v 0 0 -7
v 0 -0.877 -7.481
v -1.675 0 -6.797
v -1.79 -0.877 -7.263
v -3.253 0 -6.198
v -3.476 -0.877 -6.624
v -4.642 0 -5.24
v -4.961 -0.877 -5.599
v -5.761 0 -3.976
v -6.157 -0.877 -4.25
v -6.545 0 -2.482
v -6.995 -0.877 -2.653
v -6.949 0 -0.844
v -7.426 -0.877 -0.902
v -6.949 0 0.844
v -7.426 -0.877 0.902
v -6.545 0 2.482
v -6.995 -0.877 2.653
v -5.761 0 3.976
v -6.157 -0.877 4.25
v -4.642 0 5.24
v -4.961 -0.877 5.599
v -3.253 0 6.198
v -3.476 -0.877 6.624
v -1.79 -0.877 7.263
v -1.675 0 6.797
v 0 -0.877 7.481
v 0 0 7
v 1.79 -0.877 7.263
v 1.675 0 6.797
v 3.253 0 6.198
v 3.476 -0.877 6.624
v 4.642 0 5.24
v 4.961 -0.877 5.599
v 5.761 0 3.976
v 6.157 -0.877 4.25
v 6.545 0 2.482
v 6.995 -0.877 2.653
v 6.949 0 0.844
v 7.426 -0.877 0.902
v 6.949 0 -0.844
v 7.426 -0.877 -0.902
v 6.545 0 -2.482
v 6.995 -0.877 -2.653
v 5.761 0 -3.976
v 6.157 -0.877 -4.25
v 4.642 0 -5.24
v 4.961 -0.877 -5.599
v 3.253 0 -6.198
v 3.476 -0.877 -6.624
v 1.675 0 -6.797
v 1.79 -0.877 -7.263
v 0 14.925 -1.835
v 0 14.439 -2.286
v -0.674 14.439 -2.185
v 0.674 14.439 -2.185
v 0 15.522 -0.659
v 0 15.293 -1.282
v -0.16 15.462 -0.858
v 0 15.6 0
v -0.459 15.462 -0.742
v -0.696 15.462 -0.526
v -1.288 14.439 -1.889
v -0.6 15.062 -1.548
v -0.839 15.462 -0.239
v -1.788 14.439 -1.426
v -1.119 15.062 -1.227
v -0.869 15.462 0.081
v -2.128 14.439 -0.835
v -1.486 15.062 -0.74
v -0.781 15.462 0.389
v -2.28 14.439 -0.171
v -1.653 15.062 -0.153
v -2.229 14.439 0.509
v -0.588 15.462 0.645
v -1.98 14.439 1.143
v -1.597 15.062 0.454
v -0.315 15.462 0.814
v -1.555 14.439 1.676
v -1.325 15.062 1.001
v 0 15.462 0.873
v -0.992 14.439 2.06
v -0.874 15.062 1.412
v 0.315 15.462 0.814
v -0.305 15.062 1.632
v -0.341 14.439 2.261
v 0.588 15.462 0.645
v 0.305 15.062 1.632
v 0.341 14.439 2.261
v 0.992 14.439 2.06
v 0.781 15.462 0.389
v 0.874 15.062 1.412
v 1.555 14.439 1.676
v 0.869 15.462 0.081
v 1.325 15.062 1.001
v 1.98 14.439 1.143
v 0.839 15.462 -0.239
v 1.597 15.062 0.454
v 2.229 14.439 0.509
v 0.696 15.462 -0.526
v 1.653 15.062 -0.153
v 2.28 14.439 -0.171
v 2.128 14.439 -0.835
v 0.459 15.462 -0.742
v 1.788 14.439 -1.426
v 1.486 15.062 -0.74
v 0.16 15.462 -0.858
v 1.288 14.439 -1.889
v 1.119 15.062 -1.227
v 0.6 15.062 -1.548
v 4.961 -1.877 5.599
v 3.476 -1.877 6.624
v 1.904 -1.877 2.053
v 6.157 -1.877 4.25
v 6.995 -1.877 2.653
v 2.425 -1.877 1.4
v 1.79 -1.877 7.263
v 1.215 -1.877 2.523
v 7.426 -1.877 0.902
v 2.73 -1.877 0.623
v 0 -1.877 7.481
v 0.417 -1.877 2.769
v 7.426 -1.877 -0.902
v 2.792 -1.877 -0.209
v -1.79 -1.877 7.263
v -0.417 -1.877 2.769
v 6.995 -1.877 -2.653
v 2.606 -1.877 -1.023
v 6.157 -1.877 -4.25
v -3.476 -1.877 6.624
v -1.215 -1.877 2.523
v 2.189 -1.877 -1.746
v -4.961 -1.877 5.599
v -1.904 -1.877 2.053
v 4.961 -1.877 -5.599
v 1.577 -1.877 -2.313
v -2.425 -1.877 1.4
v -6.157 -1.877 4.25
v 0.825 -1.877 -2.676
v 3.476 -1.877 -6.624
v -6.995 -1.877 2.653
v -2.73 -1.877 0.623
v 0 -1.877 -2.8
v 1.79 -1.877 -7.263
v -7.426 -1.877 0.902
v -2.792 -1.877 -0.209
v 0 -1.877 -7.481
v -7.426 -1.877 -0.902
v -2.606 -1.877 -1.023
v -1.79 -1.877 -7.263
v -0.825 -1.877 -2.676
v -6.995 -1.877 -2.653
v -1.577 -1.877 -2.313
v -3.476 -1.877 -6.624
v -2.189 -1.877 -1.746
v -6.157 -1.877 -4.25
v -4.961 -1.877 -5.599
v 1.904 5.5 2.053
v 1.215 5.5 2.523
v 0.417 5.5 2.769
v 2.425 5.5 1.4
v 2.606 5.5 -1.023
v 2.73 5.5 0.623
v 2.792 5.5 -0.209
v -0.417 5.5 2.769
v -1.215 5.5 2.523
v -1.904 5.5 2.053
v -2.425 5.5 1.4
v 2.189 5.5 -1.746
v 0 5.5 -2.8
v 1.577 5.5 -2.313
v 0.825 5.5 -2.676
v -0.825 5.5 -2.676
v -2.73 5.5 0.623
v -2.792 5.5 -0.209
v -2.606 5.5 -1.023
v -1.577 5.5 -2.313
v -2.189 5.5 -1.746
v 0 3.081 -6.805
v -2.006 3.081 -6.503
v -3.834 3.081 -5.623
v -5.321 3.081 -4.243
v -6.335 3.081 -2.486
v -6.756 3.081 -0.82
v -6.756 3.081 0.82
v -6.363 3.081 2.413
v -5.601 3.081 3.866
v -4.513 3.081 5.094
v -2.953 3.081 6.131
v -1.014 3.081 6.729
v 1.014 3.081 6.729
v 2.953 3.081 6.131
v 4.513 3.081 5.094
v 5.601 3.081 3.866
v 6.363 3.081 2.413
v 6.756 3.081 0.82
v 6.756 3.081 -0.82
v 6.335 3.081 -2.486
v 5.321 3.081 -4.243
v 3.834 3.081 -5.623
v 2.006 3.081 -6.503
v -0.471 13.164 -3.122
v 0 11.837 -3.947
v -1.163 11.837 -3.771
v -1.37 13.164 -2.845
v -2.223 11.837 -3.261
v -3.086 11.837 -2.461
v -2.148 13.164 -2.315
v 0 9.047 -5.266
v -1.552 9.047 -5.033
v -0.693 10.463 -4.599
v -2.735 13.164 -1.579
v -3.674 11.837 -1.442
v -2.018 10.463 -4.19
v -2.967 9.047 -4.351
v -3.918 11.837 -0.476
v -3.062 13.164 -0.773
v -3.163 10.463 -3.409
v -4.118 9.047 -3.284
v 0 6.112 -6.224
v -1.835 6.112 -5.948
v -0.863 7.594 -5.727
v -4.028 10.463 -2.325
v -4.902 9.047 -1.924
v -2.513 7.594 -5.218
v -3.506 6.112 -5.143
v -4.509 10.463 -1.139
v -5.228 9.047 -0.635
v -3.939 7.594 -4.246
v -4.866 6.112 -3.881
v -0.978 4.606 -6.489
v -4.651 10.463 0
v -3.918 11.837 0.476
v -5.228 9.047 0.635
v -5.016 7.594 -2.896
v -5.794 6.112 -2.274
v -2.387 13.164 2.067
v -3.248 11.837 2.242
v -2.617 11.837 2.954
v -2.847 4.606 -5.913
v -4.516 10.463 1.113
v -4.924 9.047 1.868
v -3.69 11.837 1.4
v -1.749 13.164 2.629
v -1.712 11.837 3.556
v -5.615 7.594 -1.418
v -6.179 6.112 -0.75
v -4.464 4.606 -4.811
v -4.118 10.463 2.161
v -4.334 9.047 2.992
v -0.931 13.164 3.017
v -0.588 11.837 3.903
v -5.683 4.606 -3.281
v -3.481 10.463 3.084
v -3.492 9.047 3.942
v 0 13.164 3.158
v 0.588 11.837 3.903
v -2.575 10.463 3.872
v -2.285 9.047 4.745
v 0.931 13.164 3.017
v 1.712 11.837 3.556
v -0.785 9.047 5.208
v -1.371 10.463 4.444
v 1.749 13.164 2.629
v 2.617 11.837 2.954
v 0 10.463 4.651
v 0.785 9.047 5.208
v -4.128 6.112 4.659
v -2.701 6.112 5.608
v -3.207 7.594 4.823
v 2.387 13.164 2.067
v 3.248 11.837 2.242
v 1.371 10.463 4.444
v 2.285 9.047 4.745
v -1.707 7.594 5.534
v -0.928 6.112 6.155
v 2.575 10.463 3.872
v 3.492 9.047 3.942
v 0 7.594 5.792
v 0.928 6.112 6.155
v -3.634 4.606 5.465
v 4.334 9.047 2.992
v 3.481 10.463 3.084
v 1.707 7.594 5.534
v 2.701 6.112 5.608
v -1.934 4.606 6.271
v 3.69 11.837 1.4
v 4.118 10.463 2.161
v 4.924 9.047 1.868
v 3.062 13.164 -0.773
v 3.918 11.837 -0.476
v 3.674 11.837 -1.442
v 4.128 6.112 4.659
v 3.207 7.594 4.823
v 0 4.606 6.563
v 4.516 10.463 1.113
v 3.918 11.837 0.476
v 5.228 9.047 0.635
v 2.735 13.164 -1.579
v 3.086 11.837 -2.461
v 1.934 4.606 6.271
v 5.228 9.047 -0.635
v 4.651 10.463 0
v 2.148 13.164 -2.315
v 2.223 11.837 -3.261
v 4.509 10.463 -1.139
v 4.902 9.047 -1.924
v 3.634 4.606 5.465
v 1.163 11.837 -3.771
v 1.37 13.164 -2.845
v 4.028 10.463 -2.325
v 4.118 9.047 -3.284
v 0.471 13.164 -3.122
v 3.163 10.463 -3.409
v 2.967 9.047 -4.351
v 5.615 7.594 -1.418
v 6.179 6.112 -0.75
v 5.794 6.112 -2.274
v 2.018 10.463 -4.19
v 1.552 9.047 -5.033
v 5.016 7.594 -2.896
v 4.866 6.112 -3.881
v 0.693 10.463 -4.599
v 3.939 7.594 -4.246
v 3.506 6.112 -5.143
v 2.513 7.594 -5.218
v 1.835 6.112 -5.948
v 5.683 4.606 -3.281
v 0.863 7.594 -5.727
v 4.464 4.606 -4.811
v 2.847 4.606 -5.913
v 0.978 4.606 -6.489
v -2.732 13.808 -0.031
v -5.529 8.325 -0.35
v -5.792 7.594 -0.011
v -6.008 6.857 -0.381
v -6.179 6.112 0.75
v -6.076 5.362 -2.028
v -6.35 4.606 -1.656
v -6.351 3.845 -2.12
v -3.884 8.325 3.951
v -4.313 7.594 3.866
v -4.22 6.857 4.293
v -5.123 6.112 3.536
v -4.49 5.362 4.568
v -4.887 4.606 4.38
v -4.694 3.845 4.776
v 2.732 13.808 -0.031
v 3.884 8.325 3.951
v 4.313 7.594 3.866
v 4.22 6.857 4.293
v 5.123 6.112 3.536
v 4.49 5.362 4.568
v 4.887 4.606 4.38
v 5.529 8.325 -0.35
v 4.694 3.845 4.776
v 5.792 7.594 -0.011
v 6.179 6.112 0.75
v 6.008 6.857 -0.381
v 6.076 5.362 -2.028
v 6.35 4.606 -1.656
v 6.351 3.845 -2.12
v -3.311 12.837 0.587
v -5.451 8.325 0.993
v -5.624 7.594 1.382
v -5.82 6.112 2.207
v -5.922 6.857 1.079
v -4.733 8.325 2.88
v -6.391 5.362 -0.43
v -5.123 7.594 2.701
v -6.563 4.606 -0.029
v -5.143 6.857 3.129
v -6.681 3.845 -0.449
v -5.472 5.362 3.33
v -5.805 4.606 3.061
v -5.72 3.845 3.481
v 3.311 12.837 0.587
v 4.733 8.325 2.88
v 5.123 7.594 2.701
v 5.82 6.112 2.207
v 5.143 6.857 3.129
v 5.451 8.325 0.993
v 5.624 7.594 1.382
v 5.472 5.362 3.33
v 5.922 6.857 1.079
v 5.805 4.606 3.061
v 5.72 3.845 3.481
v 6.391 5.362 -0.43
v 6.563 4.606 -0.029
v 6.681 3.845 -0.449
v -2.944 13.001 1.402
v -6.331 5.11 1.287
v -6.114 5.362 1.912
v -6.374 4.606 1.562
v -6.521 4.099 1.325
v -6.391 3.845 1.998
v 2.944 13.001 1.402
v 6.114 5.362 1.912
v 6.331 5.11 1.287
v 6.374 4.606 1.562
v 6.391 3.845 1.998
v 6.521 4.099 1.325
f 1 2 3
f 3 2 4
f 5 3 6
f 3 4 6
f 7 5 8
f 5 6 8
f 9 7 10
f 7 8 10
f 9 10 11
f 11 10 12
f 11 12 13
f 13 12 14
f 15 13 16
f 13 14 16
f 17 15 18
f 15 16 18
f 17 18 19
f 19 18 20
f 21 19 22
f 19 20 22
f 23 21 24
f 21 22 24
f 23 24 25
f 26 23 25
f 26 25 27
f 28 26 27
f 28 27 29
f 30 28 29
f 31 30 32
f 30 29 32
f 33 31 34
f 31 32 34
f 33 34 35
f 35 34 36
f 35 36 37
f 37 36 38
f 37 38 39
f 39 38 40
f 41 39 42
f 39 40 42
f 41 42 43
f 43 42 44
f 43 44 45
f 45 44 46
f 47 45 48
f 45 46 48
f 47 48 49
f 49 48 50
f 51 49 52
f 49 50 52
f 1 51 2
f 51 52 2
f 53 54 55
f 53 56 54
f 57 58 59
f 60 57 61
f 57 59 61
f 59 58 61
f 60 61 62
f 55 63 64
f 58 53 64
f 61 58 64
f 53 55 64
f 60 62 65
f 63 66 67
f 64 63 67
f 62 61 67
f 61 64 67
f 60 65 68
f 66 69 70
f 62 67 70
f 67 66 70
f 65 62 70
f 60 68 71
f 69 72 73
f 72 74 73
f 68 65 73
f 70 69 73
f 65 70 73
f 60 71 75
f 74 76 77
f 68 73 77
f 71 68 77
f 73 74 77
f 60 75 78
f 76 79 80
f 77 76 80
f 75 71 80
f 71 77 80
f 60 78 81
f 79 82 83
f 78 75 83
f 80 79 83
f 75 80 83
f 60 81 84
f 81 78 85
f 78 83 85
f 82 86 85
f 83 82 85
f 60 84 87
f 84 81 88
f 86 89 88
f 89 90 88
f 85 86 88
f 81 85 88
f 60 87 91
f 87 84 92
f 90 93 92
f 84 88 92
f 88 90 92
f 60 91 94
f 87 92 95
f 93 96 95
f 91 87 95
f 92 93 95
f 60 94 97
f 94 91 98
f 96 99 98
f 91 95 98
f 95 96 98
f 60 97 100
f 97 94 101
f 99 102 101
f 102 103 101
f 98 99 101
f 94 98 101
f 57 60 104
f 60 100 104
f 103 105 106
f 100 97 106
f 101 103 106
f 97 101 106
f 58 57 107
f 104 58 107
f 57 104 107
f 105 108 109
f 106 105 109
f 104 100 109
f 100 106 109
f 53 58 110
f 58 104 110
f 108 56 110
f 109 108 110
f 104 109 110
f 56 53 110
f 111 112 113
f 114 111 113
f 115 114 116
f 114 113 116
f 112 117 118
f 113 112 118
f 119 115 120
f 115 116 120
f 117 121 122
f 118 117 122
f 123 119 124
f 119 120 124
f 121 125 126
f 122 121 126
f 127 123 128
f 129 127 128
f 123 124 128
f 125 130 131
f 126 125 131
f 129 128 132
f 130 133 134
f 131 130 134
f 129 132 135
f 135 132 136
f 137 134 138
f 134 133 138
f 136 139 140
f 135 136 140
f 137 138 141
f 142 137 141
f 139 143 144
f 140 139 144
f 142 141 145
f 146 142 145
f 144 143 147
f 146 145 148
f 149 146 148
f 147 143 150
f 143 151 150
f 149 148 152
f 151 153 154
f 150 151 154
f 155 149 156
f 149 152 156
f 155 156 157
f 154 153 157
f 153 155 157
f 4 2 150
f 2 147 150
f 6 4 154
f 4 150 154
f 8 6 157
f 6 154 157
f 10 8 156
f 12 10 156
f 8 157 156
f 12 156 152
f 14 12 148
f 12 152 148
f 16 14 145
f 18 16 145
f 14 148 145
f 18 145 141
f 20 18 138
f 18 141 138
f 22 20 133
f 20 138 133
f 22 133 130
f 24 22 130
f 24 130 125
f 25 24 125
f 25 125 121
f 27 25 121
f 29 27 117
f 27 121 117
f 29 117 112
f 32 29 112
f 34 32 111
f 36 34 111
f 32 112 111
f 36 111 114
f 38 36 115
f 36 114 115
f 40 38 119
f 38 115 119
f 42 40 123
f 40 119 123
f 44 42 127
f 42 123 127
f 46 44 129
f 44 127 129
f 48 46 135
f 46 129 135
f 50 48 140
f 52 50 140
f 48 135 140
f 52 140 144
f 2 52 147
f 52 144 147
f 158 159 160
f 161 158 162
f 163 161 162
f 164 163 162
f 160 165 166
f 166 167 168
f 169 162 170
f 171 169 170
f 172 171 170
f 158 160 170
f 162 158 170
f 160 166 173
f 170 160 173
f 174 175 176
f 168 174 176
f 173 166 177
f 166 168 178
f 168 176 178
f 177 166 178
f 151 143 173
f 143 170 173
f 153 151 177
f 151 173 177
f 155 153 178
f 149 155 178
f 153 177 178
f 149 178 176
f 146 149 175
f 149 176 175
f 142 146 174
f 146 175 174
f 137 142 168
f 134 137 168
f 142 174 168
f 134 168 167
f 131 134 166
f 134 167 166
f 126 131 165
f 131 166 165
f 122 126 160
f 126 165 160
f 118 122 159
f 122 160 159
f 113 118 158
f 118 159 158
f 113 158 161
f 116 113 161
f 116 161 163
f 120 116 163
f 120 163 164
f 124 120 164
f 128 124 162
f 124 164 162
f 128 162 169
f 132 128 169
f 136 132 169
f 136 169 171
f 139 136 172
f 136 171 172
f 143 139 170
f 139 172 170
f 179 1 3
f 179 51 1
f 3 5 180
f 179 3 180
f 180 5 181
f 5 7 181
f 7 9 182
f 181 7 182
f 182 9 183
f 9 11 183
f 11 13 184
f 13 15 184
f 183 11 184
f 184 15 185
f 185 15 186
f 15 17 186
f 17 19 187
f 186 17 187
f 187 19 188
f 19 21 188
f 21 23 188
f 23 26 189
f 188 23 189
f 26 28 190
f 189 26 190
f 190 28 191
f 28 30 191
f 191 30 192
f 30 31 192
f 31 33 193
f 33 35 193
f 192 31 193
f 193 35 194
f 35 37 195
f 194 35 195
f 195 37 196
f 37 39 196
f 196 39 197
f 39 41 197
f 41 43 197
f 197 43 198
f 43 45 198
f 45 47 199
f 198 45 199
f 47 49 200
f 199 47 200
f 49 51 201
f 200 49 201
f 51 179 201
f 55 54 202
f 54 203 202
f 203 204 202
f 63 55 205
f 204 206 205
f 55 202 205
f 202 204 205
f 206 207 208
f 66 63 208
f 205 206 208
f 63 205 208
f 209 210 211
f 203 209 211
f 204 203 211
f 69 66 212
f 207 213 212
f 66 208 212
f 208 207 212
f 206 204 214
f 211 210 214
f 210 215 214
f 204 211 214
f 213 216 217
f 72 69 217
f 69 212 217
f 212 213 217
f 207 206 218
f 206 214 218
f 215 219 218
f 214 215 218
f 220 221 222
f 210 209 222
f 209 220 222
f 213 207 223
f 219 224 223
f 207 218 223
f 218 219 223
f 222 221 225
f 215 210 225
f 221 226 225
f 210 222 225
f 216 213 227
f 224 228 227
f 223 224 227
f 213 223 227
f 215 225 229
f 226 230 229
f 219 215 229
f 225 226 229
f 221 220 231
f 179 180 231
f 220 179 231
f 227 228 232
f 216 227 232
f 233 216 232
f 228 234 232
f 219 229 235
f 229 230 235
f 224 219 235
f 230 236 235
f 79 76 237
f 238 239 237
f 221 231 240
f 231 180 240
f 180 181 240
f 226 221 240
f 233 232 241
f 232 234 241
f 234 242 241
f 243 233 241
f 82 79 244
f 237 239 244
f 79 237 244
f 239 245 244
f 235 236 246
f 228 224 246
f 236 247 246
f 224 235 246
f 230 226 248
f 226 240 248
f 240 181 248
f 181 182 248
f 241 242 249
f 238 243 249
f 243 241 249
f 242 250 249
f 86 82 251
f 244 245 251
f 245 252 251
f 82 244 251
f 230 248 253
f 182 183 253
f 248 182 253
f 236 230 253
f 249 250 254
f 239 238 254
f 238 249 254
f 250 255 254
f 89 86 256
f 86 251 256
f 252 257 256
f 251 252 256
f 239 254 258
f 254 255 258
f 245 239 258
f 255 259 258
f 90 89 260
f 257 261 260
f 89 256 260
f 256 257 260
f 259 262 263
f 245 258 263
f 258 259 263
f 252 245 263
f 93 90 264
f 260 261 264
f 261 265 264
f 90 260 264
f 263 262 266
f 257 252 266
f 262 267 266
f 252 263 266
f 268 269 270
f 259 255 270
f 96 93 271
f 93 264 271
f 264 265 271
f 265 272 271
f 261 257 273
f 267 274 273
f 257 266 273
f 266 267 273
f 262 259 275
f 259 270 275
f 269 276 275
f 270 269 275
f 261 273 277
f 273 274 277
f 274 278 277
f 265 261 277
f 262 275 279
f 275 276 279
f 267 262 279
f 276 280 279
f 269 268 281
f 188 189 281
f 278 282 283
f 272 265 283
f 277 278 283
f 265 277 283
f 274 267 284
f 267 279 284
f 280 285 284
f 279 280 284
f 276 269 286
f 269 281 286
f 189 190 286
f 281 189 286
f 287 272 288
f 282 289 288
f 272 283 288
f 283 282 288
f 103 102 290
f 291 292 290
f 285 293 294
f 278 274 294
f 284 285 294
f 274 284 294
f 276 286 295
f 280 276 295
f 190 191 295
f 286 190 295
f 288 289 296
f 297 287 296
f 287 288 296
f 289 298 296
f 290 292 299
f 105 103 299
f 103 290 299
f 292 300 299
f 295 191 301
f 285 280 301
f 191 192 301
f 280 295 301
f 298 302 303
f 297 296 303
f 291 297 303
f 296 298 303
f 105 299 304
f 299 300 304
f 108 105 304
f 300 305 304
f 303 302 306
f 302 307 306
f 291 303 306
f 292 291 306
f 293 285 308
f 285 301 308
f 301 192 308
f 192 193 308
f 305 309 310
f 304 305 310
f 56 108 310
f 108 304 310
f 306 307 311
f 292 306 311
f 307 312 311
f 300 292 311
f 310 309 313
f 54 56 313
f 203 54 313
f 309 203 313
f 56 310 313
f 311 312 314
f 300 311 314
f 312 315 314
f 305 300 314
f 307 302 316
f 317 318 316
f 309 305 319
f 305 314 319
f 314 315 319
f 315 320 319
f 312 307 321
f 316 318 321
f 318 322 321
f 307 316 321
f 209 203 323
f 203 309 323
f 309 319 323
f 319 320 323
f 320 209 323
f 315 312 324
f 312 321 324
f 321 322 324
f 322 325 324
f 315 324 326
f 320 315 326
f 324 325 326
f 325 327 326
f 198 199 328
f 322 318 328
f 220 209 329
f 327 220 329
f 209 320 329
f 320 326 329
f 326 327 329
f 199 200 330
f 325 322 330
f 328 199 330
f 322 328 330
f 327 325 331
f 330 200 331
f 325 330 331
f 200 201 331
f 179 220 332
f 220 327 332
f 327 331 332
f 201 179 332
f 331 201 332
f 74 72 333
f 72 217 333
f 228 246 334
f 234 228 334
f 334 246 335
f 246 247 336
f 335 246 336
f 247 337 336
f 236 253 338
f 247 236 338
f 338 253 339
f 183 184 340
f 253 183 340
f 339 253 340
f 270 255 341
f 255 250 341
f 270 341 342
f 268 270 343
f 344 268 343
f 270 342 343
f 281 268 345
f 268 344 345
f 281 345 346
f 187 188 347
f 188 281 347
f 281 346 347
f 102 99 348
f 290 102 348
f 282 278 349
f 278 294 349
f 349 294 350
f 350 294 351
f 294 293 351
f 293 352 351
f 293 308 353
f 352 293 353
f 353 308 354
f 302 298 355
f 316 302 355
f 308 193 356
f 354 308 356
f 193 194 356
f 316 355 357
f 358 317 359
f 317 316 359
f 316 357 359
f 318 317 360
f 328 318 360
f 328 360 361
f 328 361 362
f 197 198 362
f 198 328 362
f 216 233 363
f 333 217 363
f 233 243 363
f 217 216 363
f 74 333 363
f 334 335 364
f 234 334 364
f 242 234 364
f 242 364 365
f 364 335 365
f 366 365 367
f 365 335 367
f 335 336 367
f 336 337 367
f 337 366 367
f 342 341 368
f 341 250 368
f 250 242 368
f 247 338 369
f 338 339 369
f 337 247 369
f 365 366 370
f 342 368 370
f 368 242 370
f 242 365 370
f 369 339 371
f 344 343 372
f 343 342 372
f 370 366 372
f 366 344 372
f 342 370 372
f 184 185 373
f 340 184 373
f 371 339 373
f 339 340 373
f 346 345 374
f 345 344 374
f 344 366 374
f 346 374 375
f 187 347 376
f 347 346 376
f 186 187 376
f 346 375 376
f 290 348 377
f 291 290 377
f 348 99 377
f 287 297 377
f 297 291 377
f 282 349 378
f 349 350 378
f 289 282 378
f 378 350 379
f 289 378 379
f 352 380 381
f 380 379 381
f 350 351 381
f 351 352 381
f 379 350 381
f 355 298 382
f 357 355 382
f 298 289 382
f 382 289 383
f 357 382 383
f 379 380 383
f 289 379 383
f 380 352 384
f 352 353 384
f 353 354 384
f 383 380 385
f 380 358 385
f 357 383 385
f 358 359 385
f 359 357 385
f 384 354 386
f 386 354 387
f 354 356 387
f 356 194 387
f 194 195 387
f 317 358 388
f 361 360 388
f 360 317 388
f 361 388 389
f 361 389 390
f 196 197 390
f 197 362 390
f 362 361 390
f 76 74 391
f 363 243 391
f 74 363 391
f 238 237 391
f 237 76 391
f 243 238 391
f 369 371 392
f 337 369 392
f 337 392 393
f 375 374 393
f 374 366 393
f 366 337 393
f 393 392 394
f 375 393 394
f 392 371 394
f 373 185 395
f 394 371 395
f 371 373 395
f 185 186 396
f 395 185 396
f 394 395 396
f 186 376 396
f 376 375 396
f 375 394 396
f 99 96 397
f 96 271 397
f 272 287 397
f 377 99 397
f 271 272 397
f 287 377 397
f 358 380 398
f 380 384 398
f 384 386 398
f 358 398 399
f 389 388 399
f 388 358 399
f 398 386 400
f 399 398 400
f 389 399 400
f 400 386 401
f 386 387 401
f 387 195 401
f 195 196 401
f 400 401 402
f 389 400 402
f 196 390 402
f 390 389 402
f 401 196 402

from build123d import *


with BuildPart() as part:
    # Sketch1 → Revolve1 (revolve)
    with BuildSketch(Plane(origin=(0, 0, 0), x_dir=(0, 0, -1), z_dir=(1, 0, 0))):
        with BuildLine():
            Line((2.8, 0), (2.8, 5.5))
            Line((2.8, 5.5), (0, 5.5))
            Line((0, 5.5), (0, 15.6))
            ThreePointArc((0, 15.6), (1.282121246, 15.293128453), (2.286366324, 14.439022569))
            ThreePointArc((2.286366324, 14.439022569), (5.791764957, 7.594466986), (7, 0))
            Line((7, 0), (7.480731787, -0.876867692))
            Line((7.480731787, -0.876867692), (7.480731787, -1.876867692))
            Line((7.480731787, -1.876867692), (2.8, -1.876867692))
            Line((2.8, -1.876867692), (2.8, 0))
        make_face()
    revolve(axis=Axis((0, 5.5, 0), (0, 1, 0)))


solid = part.part
